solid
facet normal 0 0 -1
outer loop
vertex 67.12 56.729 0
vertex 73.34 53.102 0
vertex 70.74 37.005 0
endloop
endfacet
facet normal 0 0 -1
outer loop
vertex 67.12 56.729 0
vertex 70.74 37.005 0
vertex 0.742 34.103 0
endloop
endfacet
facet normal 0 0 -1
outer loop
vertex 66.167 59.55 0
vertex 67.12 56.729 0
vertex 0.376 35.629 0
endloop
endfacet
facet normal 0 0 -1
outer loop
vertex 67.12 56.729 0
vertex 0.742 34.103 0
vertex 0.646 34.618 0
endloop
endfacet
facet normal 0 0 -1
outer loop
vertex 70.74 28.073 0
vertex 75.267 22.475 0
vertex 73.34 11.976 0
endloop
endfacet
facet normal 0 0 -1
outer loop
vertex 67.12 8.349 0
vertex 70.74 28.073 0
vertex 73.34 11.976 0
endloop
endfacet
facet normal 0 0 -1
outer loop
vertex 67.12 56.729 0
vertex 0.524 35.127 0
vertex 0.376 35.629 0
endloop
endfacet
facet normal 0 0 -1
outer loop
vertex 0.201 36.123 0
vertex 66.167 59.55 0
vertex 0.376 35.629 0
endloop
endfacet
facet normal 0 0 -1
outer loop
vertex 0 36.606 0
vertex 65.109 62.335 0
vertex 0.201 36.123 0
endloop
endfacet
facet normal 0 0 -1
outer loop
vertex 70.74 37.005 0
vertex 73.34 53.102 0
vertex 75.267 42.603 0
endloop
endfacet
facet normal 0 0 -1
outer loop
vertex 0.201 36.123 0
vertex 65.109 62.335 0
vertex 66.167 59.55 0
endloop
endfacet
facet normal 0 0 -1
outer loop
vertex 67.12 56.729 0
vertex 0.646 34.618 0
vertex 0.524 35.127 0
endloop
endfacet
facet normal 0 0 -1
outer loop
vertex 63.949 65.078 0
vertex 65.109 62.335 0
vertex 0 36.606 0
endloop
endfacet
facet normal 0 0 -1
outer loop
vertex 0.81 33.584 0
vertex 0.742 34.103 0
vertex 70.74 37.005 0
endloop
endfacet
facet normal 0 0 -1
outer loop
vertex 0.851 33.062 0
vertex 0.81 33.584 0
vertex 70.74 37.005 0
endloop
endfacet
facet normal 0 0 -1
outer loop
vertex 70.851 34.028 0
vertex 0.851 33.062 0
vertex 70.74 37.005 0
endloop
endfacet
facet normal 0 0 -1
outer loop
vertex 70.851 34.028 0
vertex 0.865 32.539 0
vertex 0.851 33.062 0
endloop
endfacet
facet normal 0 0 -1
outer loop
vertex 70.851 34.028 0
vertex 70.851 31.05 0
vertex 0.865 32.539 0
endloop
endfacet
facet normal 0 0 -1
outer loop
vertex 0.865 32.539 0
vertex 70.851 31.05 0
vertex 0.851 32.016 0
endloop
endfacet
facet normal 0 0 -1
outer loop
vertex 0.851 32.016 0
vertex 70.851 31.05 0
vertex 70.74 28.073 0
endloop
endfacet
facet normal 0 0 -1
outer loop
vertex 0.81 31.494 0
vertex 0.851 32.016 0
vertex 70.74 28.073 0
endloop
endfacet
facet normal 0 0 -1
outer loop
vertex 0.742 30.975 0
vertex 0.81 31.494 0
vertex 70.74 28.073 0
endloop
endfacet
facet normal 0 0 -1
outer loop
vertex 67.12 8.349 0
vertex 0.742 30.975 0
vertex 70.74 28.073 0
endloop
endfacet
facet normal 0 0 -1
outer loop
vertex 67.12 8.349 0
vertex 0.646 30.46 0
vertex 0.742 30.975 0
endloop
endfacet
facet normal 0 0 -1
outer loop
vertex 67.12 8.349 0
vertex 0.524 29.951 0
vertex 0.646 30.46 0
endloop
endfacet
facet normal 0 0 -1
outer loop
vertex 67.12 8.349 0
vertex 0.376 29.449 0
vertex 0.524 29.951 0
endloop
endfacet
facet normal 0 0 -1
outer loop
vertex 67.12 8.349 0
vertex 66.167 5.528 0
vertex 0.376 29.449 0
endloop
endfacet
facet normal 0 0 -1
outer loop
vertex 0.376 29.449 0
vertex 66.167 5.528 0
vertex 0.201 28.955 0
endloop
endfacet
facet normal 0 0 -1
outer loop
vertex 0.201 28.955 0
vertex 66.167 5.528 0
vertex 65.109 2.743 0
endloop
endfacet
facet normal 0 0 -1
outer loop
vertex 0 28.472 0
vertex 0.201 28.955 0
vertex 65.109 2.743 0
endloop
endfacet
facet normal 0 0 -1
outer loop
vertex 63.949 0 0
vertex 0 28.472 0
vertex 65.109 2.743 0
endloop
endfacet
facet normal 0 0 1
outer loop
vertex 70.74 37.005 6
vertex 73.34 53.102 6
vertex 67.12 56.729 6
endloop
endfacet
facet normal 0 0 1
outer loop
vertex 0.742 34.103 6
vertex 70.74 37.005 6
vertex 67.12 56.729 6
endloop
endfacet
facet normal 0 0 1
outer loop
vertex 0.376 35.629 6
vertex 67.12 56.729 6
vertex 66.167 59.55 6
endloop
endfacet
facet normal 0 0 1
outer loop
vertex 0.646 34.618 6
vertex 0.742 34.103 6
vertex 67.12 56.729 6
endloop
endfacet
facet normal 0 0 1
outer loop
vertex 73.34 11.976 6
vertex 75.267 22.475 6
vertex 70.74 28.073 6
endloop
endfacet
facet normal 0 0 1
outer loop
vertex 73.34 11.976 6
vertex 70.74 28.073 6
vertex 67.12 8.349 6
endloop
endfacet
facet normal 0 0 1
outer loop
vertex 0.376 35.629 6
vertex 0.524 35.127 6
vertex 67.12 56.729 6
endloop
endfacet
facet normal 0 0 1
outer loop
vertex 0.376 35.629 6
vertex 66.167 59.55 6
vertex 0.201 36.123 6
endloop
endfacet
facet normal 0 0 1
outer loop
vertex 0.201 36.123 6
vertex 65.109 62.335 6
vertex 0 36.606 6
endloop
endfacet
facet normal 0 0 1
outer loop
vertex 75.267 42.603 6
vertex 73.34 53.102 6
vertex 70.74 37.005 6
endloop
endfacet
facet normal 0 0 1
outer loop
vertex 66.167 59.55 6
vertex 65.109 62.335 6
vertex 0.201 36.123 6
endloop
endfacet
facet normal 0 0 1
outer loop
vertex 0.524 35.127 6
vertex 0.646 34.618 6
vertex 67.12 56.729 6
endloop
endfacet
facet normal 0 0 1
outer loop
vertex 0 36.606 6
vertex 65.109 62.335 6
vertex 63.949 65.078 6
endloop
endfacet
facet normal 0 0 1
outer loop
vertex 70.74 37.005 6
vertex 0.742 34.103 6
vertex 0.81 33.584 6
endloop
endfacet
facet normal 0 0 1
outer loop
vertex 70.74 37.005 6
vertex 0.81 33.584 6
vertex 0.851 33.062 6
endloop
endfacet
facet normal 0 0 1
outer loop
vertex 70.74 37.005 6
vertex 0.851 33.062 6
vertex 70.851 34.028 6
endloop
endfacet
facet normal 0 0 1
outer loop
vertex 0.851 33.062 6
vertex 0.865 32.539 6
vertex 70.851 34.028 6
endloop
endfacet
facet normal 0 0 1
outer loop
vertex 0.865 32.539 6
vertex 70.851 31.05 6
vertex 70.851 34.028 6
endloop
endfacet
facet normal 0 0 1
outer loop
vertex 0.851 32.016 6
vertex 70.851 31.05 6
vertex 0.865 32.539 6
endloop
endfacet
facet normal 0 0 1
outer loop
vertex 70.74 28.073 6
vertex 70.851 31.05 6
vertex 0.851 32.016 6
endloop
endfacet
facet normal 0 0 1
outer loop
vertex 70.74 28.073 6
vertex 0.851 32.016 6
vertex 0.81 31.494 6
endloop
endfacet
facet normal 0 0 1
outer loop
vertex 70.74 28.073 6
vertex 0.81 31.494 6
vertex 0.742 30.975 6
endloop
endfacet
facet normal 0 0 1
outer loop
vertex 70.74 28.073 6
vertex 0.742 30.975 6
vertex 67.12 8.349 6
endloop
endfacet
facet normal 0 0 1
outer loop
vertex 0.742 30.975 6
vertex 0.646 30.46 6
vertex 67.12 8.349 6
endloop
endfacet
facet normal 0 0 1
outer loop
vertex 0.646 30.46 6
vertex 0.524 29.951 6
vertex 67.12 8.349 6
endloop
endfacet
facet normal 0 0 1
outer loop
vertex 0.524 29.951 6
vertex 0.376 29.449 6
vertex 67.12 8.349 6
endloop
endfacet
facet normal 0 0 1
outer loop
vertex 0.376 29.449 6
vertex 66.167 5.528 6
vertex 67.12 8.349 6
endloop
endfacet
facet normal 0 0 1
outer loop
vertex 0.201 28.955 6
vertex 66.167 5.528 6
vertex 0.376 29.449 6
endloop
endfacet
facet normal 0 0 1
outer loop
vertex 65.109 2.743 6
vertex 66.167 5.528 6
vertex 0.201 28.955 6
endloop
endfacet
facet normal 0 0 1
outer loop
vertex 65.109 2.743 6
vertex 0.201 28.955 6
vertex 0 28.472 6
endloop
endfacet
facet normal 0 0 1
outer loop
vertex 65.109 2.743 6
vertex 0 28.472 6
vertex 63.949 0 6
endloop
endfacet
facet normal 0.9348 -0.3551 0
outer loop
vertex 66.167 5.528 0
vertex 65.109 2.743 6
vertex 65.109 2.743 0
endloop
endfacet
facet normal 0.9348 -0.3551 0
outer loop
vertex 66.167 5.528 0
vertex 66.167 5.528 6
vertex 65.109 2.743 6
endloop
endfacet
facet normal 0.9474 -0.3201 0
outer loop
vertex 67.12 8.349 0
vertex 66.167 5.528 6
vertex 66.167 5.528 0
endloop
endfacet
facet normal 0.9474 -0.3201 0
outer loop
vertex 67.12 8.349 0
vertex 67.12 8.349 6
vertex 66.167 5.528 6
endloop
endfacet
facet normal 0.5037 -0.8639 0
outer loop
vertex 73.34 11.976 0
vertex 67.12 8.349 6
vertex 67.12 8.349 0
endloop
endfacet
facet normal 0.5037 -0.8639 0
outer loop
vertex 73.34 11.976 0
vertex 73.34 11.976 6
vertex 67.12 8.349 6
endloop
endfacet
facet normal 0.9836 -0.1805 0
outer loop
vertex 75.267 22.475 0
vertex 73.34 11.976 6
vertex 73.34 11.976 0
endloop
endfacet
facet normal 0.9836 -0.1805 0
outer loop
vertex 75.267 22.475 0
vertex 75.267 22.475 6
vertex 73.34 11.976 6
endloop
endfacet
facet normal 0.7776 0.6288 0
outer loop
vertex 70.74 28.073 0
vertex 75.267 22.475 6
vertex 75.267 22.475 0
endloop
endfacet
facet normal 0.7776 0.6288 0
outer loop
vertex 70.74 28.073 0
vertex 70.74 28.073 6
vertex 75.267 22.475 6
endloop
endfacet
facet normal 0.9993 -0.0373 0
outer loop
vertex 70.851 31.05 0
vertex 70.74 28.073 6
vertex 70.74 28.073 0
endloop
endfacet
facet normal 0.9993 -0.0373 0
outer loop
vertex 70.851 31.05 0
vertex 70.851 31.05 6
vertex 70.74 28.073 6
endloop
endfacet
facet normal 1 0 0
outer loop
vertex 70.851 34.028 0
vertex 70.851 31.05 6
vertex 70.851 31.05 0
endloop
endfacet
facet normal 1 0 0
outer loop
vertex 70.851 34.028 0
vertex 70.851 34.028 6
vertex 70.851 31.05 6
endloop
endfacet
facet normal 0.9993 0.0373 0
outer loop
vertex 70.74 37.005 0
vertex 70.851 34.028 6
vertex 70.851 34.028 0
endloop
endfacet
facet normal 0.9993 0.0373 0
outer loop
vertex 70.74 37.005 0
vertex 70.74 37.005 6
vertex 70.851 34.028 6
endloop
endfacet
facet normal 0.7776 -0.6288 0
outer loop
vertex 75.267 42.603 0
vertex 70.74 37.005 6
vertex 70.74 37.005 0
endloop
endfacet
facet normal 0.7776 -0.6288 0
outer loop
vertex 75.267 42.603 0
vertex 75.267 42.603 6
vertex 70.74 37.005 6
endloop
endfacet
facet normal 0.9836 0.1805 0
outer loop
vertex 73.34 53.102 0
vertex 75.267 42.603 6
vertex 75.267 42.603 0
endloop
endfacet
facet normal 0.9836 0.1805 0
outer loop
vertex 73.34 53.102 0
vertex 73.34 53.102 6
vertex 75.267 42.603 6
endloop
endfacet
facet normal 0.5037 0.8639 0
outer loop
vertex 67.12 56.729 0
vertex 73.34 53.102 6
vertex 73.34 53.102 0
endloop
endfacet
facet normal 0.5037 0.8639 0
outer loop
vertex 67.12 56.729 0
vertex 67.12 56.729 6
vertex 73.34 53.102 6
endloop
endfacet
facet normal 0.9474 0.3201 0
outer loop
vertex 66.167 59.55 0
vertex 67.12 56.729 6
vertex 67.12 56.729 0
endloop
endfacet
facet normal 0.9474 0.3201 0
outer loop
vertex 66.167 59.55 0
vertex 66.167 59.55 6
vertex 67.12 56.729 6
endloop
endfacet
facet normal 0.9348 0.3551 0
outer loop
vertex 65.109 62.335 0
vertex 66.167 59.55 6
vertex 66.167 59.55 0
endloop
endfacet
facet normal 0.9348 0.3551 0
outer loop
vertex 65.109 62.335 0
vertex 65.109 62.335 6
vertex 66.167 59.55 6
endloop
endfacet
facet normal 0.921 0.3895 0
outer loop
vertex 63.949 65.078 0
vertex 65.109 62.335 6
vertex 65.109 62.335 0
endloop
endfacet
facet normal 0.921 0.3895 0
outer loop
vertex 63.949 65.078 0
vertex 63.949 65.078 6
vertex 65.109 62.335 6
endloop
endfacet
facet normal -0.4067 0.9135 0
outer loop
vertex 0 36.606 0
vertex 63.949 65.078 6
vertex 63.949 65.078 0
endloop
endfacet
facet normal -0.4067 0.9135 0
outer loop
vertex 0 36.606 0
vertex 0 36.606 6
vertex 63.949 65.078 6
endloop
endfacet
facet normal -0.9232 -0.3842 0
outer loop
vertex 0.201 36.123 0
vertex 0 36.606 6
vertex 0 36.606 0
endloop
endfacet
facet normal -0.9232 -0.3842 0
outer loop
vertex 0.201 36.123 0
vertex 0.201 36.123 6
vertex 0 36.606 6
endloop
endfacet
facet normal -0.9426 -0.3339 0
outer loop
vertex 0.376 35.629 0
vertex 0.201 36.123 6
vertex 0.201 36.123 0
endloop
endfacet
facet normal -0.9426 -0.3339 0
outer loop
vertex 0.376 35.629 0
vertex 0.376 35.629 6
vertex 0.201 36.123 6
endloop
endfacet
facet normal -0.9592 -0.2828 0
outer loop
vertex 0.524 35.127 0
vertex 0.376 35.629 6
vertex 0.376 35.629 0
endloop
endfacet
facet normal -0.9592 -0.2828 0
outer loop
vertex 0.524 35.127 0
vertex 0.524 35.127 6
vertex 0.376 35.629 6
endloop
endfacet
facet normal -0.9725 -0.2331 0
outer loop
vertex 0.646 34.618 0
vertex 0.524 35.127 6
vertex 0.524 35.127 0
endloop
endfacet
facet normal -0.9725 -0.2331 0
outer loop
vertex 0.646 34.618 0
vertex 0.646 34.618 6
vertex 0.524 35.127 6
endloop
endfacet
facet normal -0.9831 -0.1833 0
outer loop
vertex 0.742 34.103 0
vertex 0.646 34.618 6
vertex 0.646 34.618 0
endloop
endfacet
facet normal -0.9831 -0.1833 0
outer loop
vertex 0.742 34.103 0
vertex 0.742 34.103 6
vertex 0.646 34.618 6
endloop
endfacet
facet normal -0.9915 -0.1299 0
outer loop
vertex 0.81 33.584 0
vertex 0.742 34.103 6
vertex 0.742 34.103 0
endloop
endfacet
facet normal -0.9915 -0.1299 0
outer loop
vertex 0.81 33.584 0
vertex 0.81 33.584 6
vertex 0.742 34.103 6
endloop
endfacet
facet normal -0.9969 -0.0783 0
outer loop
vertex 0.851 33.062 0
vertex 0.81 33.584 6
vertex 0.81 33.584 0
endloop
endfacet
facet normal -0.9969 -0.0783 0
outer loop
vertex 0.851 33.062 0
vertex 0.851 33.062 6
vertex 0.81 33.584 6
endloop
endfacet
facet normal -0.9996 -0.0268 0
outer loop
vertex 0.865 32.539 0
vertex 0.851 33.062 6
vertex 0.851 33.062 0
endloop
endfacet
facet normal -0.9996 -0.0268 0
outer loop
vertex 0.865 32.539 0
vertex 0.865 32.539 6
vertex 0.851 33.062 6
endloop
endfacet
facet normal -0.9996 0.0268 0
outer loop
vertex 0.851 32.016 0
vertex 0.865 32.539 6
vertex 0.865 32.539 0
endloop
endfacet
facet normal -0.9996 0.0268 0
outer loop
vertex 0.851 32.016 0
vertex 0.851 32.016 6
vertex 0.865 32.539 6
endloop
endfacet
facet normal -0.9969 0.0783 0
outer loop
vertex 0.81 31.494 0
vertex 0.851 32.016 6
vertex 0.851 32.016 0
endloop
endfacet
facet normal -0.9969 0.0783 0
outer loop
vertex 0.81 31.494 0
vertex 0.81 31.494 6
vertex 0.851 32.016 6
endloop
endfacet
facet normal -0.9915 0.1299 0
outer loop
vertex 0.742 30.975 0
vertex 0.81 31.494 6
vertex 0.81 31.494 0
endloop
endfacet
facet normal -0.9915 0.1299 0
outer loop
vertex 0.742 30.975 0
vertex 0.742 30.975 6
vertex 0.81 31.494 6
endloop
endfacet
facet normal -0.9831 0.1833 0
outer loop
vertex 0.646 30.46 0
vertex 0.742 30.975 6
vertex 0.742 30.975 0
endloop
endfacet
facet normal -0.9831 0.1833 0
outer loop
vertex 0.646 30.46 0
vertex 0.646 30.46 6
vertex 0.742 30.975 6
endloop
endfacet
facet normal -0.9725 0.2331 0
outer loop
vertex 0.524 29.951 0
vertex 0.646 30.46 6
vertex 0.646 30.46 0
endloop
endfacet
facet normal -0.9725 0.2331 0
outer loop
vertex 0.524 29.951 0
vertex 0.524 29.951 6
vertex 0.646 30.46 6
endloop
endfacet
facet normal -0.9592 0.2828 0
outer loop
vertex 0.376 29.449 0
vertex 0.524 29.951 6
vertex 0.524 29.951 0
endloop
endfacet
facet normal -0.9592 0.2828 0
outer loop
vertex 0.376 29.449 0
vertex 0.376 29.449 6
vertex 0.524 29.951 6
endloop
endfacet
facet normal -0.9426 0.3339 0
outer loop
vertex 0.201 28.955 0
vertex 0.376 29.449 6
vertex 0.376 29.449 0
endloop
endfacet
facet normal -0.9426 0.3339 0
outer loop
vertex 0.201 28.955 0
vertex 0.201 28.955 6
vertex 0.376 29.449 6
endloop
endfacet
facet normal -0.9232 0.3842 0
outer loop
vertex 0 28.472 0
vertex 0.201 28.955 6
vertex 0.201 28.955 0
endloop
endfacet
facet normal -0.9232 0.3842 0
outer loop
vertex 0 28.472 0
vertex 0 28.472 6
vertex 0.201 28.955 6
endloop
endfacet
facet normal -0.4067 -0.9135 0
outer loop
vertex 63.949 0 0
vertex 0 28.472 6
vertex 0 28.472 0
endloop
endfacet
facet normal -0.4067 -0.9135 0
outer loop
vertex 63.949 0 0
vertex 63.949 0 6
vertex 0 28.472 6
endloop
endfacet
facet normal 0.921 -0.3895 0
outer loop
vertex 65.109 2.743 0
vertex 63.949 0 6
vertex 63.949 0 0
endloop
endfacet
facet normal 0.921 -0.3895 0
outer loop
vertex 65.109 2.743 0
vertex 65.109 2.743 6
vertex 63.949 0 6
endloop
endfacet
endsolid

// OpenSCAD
$fn = 32;

// ----------------------------------------------------------------------
// Gear sector: 2 teeth on 48 degrees
// ----------------------------------------------------------------------

// --- parameters (mm) ---
sector_angle = 48;        // sector angle, degrees
root_r = 80;              // root circle radius
tooth_h = 5;              // tooth height over the root circle
teeth = 2;                // number of teeth on the sector
hub_r = 10;               // hub bore radius
plate_t = 6;              // sector thickness, Z
arc_step = 3;             // sampling step of the root/hub arcs, degrees

tip_r = root_r + tooth_h;  // tip circle radius

profile = [[63.949, 0], [65.109, 2.743], [66.167, 5.528], [67.12, 8.349], [73.34, 11.976], [75.267, 22.475], [70.74, 28.073], [70.851, 31.05], [70.851, 34.028], [70.74, 37.005], [75.267, 42.603], [73.34, 53.102], [67.12, 56.729], [66.167, 59.55], [65.109, 62.335], [63.949, 65.078], [0, 36.606], [0.201, 36.123], [0.376, 35.629], [0.524, 35.127], [0.646, 34.618], [0.742, 34.103], [0.81, 33.584], [0.851, 33.062], [0.865, 32.539], [0.851, 32.016], [0.81, 31.494], [0.742, 30.975], [0.646, 30.46], [0.524, 29.951], [0.376, 29.449], [0.201, 28.955], [0, 28.472]];  // primary outline, 33 points, counter clockwise

// --- the one profile operation ---
linear_extrude(height = plate_t) polygon(points = profile);
